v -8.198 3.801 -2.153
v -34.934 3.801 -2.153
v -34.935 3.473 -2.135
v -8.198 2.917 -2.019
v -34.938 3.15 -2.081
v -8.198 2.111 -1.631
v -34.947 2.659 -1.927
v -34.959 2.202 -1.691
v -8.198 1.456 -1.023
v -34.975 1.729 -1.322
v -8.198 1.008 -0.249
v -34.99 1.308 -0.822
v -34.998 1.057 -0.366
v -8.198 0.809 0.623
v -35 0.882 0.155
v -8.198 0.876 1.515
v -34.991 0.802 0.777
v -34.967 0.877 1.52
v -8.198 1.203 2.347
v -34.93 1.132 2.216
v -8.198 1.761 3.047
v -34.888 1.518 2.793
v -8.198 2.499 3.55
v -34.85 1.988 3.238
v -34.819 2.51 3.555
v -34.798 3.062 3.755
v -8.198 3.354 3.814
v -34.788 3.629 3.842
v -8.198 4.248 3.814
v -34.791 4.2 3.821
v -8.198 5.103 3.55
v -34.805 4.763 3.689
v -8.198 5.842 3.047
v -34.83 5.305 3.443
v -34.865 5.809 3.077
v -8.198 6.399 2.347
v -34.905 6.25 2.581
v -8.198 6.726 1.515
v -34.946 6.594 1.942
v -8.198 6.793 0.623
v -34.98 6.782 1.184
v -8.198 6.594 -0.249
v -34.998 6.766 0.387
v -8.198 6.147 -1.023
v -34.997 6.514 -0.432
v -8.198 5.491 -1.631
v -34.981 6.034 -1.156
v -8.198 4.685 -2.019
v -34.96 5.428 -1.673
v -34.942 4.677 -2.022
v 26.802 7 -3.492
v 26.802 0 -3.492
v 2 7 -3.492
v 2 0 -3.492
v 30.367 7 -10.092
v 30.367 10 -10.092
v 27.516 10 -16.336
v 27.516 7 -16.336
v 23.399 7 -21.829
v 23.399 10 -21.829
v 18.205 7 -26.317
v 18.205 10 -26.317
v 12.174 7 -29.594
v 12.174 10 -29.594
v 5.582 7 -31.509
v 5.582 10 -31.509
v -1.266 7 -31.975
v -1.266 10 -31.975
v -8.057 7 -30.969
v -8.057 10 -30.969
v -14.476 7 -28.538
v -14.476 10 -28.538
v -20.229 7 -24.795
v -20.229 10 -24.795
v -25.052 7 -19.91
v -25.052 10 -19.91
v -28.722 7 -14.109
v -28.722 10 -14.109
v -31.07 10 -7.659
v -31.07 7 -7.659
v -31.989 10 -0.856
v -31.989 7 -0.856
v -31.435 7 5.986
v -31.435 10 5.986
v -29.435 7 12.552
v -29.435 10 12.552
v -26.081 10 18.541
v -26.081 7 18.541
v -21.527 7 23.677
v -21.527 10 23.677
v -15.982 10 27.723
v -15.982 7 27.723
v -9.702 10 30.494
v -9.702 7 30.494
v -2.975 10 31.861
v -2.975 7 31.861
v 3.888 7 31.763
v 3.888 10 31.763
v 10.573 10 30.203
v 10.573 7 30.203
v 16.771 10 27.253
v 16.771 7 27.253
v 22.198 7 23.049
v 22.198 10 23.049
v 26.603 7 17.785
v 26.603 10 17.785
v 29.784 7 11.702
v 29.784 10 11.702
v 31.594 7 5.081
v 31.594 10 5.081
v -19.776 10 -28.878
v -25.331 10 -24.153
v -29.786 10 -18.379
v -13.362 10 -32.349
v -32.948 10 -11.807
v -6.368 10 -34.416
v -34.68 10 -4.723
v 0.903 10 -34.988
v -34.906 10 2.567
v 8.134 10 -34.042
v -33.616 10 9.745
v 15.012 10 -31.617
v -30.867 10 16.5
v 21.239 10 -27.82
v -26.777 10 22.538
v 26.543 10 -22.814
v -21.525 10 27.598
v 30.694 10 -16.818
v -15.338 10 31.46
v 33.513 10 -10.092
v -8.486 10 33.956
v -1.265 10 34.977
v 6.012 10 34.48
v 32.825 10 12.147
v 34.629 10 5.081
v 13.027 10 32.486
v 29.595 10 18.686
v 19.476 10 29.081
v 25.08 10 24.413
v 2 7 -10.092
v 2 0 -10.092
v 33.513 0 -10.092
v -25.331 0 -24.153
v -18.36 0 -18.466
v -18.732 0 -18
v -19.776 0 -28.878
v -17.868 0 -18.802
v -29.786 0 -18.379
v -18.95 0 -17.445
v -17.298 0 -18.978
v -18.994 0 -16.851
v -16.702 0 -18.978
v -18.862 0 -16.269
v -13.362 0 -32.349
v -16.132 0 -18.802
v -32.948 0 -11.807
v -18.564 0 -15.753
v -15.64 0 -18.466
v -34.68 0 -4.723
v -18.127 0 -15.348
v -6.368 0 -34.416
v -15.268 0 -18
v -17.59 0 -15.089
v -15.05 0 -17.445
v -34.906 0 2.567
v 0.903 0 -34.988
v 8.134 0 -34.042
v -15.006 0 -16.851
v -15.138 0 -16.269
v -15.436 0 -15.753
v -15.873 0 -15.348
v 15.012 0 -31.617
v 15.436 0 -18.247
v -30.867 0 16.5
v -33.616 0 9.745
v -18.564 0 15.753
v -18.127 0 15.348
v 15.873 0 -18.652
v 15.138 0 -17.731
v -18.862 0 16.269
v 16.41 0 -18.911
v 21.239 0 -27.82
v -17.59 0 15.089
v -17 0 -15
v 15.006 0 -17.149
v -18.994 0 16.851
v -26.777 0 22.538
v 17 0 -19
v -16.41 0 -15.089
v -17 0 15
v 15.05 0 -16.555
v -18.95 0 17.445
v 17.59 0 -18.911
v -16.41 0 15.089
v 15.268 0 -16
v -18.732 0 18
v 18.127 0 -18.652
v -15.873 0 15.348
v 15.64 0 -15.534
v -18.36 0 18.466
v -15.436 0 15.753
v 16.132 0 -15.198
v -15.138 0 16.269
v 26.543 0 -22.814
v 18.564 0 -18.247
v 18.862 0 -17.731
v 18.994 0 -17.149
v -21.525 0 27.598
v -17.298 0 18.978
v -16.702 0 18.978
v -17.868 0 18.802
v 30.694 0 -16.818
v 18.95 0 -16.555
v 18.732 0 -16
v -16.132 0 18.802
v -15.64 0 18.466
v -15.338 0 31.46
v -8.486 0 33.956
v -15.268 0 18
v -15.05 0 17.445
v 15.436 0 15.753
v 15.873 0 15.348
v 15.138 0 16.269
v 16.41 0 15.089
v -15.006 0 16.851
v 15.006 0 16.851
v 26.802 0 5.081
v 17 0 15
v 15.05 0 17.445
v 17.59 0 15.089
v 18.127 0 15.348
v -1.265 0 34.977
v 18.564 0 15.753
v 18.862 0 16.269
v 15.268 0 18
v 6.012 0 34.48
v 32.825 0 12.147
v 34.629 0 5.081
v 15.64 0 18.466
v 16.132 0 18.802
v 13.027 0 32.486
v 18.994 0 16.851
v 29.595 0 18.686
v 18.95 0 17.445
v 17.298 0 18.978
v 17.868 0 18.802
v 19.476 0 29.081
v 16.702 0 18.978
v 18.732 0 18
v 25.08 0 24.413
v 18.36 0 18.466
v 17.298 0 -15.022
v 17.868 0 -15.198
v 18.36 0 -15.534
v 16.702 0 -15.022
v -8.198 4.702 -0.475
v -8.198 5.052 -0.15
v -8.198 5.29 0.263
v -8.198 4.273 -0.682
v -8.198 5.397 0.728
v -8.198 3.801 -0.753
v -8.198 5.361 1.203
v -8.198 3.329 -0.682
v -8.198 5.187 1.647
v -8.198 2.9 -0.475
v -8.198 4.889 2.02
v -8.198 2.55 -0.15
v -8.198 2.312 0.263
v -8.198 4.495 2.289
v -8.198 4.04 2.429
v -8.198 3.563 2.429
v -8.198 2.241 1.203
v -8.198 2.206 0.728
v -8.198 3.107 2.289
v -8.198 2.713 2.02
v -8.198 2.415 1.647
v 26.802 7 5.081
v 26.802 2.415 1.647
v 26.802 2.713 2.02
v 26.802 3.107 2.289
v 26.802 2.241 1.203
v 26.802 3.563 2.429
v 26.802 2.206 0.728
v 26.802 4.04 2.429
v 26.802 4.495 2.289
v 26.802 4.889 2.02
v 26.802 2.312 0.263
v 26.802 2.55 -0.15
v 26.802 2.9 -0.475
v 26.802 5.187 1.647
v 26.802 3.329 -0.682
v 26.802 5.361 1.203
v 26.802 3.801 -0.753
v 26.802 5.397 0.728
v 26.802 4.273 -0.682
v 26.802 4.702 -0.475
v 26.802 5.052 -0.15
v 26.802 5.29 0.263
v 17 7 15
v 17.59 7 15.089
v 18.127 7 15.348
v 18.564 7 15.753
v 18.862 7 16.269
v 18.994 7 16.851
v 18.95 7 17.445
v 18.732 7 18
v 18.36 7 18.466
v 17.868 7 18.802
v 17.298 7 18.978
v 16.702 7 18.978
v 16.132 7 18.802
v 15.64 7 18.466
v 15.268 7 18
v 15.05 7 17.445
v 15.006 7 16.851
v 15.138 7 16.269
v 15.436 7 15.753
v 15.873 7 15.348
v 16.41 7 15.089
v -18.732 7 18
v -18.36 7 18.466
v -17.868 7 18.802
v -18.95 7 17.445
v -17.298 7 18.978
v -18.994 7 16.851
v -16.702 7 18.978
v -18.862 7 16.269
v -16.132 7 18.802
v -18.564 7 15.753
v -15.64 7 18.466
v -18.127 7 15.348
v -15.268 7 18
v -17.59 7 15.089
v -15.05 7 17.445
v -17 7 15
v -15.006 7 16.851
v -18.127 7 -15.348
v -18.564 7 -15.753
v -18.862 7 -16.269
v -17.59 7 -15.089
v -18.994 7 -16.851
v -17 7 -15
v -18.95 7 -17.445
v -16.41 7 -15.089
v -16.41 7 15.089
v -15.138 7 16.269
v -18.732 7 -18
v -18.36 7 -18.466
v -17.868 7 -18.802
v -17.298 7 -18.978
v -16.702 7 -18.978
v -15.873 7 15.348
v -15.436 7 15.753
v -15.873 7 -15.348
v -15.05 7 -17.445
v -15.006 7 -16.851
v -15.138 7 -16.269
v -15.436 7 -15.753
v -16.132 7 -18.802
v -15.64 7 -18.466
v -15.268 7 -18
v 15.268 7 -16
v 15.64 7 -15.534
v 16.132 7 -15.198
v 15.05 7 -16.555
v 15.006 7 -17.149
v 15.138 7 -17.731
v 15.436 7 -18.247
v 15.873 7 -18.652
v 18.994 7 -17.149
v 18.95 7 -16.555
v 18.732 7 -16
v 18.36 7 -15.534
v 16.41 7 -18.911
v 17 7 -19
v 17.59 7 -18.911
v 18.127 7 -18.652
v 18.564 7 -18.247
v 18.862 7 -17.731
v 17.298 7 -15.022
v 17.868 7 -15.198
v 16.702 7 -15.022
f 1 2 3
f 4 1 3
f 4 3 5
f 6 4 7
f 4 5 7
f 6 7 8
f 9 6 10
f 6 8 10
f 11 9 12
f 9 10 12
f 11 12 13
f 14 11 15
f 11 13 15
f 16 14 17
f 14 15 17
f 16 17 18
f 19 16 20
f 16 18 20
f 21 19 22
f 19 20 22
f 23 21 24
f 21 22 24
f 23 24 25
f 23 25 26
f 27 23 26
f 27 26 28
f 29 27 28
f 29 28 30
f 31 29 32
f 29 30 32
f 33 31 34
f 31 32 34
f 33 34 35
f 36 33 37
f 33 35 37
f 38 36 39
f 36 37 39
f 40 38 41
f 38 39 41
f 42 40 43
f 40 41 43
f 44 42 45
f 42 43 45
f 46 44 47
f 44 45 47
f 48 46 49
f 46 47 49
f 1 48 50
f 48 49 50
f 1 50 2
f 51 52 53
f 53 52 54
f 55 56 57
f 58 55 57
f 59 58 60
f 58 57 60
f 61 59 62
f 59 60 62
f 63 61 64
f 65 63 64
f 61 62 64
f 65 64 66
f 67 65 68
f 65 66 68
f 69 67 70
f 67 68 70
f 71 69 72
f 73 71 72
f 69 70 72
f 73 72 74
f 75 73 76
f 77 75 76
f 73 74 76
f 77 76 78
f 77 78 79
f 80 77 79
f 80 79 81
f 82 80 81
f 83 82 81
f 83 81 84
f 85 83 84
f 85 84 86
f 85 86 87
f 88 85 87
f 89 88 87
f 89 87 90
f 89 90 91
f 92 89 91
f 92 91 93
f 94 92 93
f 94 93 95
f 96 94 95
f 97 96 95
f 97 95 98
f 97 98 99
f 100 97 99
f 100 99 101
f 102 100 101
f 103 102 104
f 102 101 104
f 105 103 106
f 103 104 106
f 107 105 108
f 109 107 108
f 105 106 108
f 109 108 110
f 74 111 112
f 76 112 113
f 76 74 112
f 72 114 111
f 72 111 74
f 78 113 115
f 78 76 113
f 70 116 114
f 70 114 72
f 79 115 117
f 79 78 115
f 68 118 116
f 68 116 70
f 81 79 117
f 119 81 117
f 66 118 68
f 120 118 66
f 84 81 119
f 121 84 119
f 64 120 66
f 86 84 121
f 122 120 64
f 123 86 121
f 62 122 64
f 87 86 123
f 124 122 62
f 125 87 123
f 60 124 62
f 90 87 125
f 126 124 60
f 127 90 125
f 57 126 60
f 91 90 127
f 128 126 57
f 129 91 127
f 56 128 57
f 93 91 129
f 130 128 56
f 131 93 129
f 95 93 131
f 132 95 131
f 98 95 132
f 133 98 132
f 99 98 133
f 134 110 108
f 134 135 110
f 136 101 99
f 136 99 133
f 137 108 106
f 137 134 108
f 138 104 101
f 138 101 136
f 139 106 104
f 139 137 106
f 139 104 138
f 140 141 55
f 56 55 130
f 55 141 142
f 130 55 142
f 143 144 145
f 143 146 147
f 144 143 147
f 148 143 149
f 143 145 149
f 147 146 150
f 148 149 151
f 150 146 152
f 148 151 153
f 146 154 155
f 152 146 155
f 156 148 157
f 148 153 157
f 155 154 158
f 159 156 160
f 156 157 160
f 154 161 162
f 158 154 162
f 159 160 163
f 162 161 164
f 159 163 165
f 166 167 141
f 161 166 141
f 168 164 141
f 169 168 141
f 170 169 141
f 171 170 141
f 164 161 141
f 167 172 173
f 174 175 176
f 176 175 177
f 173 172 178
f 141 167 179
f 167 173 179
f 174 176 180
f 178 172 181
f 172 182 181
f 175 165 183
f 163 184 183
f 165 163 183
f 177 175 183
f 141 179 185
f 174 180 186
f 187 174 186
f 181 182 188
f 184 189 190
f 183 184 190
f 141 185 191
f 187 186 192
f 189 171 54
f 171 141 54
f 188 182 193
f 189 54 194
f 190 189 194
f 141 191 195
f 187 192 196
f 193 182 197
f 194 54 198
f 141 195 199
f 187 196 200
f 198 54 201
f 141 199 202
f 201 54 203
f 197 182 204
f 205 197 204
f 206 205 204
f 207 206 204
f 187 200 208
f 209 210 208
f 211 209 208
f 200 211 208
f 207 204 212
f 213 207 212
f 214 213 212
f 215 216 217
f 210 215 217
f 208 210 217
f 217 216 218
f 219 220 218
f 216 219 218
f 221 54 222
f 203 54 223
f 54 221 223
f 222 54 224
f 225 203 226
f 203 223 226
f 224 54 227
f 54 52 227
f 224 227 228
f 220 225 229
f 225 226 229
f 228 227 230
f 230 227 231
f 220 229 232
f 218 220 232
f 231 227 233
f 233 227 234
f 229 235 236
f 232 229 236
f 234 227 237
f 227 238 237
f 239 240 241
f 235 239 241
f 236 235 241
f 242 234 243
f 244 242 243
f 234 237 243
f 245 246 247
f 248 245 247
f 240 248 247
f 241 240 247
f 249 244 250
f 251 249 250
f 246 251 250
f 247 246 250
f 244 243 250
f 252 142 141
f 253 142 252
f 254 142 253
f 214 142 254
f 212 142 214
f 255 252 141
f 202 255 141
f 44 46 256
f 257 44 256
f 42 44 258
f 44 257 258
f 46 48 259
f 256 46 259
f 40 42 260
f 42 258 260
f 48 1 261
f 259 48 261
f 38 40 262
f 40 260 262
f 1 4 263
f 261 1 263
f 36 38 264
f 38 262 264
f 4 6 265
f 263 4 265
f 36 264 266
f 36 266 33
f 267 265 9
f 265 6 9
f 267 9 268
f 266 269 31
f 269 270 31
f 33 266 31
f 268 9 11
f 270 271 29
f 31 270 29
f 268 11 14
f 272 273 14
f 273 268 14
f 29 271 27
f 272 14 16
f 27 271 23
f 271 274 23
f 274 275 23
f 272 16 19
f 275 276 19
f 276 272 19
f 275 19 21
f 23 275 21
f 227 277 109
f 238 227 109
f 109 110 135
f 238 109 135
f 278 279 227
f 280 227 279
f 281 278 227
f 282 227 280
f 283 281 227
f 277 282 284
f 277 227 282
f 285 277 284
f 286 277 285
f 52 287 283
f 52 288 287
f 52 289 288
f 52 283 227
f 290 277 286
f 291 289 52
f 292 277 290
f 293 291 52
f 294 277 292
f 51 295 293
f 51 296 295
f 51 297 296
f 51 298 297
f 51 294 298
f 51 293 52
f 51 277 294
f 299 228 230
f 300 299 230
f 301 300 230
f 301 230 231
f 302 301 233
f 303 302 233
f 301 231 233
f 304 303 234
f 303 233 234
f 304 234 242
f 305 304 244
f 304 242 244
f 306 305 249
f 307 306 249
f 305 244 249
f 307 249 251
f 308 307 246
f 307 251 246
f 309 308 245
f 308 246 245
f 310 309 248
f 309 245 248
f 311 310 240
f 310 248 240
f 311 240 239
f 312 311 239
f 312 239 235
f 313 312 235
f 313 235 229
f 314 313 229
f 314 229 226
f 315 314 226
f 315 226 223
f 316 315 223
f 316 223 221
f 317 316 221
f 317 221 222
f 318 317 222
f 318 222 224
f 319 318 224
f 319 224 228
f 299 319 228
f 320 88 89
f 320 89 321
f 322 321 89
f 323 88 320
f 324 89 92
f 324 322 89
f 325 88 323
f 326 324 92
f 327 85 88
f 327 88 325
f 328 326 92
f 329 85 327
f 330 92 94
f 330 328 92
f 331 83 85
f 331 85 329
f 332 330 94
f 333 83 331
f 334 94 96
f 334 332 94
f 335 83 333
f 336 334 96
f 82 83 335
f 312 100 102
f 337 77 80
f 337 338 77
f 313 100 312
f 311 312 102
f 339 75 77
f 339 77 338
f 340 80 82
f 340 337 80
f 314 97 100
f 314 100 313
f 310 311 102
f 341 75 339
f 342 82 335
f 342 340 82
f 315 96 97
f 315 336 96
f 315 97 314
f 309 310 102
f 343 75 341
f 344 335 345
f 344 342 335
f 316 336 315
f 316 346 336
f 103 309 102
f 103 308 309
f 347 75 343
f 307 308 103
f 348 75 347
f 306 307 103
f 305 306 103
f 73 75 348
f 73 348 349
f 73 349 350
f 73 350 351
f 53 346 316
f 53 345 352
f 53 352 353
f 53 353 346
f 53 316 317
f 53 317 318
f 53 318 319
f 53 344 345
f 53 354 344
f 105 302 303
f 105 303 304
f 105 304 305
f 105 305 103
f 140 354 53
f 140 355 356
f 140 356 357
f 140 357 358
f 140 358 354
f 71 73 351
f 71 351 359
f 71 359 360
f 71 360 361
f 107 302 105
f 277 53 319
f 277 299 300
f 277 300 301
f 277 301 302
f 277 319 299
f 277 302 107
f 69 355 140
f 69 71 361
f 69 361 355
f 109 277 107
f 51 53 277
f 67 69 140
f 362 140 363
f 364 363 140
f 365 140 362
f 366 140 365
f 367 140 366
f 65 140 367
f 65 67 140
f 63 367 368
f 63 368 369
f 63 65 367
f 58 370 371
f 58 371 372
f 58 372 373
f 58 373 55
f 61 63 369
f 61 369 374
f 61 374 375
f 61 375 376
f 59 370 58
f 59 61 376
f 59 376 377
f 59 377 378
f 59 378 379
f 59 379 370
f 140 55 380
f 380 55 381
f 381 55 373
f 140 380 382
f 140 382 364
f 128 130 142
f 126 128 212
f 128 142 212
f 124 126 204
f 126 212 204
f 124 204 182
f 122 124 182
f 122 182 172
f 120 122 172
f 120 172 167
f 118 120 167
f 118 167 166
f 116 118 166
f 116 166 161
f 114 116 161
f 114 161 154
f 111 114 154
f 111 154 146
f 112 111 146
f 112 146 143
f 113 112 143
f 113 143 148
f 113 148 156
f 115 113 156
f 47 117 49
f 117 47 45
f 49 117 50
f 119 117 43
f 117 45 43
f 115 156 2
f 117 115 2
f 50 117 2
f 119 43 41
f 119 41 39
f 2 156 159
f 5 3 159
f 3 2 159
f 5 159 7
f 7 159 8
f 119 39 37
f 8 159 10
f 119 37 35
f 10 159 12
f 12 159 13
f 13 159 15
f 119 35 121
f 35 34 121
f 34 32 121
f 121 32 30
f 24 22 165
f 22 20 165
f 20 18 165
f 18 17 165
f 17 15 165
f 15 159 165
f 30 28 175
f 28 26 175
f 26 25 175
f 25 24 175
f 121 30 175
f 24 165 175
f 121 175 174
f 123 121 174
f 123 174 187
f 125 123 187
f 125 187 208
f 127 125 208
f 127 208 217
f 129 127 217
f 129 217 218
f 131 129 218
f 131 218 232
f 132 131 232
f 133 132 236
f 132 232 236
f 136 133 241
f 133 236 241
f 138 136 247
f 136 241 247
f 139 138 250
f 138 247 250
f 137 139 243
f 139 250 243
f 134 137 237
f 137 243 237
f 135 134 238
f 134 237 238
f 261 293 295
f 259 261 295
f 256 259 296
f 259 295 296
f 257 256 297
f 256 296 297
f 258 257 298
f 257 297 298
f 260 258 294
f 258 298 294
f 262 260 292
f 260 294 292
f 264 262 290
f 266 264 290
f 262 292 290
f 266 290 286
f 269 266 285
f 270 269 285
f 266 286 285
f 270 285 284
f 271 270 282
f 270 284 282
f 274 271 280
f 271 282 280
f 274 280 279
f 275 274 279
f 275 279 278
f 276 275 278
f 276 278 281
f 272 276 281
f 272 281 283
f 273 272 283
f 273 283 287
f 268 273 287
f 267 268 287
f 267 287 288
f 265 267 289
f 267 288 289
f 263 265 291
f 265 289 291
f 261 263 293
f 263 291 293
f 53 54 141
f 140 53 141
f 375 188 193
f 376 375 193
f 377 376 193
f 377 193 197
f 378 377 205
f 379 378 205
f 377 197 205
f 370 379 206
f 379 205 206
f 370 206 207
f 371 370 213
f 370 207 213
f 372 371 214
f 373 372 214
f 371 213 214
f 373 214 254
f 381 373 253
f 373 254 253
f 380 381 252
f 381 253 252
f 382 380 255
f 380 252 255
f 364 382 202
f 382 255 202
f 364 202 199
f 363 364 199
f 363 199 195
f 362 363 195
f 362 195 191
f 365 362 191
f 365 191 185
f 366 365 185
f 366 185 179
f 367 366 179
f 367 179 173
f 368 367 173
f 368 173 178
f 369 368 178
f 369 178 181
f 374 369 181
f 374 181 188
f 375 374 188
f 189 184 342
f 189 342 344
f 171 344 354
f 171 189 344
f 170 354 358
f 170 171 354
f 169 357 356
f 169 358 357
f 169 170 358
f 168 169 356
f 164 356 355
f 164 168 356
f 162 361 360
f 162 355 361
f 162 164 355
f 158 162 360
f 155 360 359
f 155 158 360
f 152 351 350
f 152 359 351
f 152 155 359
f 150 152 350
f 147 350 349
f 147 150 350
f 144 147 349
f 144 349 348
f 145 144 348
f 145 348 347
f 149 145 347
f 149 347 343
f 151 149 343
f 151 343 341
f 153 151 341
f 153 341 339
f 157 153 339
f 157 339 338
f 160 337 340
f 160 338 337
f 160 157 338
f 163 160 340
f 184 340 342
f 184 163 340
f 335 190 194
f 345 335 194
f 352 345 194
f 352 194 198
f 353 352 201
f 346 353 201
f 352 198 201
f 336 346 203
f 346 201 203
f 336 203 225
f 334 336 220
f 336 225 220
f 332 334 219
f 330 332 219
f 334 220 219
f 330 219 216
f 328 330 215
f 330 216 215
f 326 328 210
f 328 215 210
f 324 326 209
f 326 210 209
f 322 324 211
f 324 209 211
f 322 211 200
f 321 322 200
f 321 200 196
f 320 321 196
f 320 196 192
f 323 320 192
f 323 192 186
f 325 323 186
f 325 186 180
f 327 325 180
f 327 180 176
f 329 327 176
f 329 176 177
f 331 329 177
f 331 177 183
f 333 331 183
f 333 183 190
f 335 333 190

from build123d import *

# Parameters (mm, degrees)
SKETCH1_R               = 35
BOSS_EXTRUDE1_DEPTH     = 10
SKETCH27_W              = 8.45046724
SKETCH27_H              = 8.572937779
CUT_EXTRUDE8_DEPTH      = 51.497524692
CUT_EXTRUDE9_DEPTH      = 51.497524692
CUT_EXTRUDE9_DEPTH_BACK = 51.497524692
SKETCH34_R              = 2
SKETCH35_R              = 2
CUT_EXTRUDE10_DEPTH     = 51.497524692
SKETCH36_R              = 2
CUT_EXTRUDE11_DEPTH     = 51.497524692
SKETCH37_R              = 2
CUT_EXTRUDE12_DEPTH     = 51.497524692
SKETCH39_R              = 32
CUT_EXTRUDE14_DEPTH     = 3
SKETCH40_R              = 1.6
CUT_EXTRUDE16_DEPTH     = 35
SKETCH49_W              = 3
SKETCH49_H              = 26.802326962
CUT_EXTRUDE18_DEPTH     = 51.49752485


with BuildPart() as part:
    # Sketch1 → Boss-Extrude1 (new body)
    with BuildSketch(Plane(origin=(0, 0, 0), x_dir=(1, 0, 0), z_dir=(0, 1, 0))):
        with Locations(Location((0, 0, 0), (0, 0, 270))):
            Circle(SKETCH1_R)
    extrude(amount=BOSS_EXTRUDE1_DEPTH)

    # Sketch27 → Cut-Extrude8 (cut, through all)
    with BuildSketch(Plane(origin=(0, 10, 0), x_dir=(1, 0, 0), z_dir=(0, 1, 0))):
        with Locations((31.027560582, -0.794372815)):
            Rectangle(SKETCH27_W, SKETCH27_H)
    extrude(amount=-CUT_EXTRUDE8_DEPTH, mode=Mode.SUBTRACT)

    # Sketch34 → Cut-Extrude9 (cut, two sides: drawn at the far end of the back side and taken through both)
    with BuildSketch(Plane(origin=(0, 10, 0), x_dir=(1, 0, 0), z_dir=(0, 1, 0)).offset(-CUT_EXTRUDE9_DEPTH_BACK)):
        with Locations(Location((-17, 17, 0), (0, 0, 270))):
            Circle(SKETCH34_R)
    extrude(amount=CUT_EXTRUDE9_DEPTH + CUT_EXTRUDE9_DEPTH_BACK, mode=Mode.SUBTRACT)

    # Sketch35 → Cut-Extrude10 (cut, through all)
    with BuildSketch(Plane(origin=(0, 0, 0), x_dir=(-1, 0, 0), z_dir=(0, -1, 0))):
        with Locations(Location((-17, 17, 0), (0, 0, 90))):
            Circle(SKETCH35_R)
    extrude(amount=-CUT_EXTRUDE10_DEPTH, mode=Mode.SUBTRACT)

    # Sketch36 → Cut-Extrude11 (cut, through all)
    with BuildSketch(Plane(origin=(0, 0, 0), x_dir=(-1, 0, 0), z_dir=(0, -1, 0))):
        with Locations(Location((17, -17, 0), (0, 0, 90))):
            Circle(SKETCH36_R)
    extrude(amount=-CUT_EXTRUDE11_DEPTH, mode=Mode.SUBTRACT)

    # Sketch37 → Cut-Extrude12 (cut, through all)
    with BuildSketch(Plane.XZ):
        with Locations(Location((17, 17, 0), (0, 0, 270))):
            Circle(SKETCH37_R)
    extrude(amount=-CUT_EXTRUDE12_DEPTH, mode=Mode.SUBTRACT)

    # Sketch39 → Cut-Extrude14 (cut)
    with BuildSketch(Plane(origin=(0, 10, 0), x_dir=(1, 0, 0), z_dir=(0, 1, 0))):
        Circle(SKETCH39_R)
    extrude(amount=-CUT_EXTRUDE14_DEPTH, mode=Mode.SUBTRACT)

    # Sketch40 → Cut-Extrude16 (cut)
    with BuildSketch(Plane(origin=(26.802326962, 0, 0), x_dir=(0, 0, -1), z_dir=(1, 0, 0))):
        with Locations((-0.847360281, 3.801055622)):
            Circle(SKETCH40_R)
    extrude(amount=-CUT_EXTRUDE16_DEPTH, mode=Mode.SUBTRACT)

    # Sketch49 → Ø6.0mm Dowel Hole6 (revolve, cut)
    with BuildSketch(Plane(origin=(-8.197673038, 3.801055622, 0.847360281), x_dir=(0, 0, -1), z_dir=(0, 1, 0))):
        with Locations((1.5, 13.401163481)):
            Rectangle(SKETCH49_W, SKETCH49_H)
    revolve(axis=Axis((-1.847673038, 3.801055622, 0.847360281), (-1, 0, 0)), mode=Mode.SUBTRACT)

    # Sketch52 → Cut-Extrude18 (cut, through all)
    with BuildSketch(Plane(origin=(0, 0, 0), x_dir=(-1, 0, 0), z_dir=(0, -1, 0))):
        Polygon((-26.802326962, 3.492096074), (-1.999842463, 3.492096074), (-1.999842463, 10.092096074), (-33.513424129, 10.092096074), (-39.471976124, 10.092096074), (-42.019310815, 10.092096074), (-42.019310815, 3.492096074), align=None)
    extrude(amount=-CUT_EXTRUDE18_DEPTH, mode=Mode.SUBTRACT)


solid = part.part
